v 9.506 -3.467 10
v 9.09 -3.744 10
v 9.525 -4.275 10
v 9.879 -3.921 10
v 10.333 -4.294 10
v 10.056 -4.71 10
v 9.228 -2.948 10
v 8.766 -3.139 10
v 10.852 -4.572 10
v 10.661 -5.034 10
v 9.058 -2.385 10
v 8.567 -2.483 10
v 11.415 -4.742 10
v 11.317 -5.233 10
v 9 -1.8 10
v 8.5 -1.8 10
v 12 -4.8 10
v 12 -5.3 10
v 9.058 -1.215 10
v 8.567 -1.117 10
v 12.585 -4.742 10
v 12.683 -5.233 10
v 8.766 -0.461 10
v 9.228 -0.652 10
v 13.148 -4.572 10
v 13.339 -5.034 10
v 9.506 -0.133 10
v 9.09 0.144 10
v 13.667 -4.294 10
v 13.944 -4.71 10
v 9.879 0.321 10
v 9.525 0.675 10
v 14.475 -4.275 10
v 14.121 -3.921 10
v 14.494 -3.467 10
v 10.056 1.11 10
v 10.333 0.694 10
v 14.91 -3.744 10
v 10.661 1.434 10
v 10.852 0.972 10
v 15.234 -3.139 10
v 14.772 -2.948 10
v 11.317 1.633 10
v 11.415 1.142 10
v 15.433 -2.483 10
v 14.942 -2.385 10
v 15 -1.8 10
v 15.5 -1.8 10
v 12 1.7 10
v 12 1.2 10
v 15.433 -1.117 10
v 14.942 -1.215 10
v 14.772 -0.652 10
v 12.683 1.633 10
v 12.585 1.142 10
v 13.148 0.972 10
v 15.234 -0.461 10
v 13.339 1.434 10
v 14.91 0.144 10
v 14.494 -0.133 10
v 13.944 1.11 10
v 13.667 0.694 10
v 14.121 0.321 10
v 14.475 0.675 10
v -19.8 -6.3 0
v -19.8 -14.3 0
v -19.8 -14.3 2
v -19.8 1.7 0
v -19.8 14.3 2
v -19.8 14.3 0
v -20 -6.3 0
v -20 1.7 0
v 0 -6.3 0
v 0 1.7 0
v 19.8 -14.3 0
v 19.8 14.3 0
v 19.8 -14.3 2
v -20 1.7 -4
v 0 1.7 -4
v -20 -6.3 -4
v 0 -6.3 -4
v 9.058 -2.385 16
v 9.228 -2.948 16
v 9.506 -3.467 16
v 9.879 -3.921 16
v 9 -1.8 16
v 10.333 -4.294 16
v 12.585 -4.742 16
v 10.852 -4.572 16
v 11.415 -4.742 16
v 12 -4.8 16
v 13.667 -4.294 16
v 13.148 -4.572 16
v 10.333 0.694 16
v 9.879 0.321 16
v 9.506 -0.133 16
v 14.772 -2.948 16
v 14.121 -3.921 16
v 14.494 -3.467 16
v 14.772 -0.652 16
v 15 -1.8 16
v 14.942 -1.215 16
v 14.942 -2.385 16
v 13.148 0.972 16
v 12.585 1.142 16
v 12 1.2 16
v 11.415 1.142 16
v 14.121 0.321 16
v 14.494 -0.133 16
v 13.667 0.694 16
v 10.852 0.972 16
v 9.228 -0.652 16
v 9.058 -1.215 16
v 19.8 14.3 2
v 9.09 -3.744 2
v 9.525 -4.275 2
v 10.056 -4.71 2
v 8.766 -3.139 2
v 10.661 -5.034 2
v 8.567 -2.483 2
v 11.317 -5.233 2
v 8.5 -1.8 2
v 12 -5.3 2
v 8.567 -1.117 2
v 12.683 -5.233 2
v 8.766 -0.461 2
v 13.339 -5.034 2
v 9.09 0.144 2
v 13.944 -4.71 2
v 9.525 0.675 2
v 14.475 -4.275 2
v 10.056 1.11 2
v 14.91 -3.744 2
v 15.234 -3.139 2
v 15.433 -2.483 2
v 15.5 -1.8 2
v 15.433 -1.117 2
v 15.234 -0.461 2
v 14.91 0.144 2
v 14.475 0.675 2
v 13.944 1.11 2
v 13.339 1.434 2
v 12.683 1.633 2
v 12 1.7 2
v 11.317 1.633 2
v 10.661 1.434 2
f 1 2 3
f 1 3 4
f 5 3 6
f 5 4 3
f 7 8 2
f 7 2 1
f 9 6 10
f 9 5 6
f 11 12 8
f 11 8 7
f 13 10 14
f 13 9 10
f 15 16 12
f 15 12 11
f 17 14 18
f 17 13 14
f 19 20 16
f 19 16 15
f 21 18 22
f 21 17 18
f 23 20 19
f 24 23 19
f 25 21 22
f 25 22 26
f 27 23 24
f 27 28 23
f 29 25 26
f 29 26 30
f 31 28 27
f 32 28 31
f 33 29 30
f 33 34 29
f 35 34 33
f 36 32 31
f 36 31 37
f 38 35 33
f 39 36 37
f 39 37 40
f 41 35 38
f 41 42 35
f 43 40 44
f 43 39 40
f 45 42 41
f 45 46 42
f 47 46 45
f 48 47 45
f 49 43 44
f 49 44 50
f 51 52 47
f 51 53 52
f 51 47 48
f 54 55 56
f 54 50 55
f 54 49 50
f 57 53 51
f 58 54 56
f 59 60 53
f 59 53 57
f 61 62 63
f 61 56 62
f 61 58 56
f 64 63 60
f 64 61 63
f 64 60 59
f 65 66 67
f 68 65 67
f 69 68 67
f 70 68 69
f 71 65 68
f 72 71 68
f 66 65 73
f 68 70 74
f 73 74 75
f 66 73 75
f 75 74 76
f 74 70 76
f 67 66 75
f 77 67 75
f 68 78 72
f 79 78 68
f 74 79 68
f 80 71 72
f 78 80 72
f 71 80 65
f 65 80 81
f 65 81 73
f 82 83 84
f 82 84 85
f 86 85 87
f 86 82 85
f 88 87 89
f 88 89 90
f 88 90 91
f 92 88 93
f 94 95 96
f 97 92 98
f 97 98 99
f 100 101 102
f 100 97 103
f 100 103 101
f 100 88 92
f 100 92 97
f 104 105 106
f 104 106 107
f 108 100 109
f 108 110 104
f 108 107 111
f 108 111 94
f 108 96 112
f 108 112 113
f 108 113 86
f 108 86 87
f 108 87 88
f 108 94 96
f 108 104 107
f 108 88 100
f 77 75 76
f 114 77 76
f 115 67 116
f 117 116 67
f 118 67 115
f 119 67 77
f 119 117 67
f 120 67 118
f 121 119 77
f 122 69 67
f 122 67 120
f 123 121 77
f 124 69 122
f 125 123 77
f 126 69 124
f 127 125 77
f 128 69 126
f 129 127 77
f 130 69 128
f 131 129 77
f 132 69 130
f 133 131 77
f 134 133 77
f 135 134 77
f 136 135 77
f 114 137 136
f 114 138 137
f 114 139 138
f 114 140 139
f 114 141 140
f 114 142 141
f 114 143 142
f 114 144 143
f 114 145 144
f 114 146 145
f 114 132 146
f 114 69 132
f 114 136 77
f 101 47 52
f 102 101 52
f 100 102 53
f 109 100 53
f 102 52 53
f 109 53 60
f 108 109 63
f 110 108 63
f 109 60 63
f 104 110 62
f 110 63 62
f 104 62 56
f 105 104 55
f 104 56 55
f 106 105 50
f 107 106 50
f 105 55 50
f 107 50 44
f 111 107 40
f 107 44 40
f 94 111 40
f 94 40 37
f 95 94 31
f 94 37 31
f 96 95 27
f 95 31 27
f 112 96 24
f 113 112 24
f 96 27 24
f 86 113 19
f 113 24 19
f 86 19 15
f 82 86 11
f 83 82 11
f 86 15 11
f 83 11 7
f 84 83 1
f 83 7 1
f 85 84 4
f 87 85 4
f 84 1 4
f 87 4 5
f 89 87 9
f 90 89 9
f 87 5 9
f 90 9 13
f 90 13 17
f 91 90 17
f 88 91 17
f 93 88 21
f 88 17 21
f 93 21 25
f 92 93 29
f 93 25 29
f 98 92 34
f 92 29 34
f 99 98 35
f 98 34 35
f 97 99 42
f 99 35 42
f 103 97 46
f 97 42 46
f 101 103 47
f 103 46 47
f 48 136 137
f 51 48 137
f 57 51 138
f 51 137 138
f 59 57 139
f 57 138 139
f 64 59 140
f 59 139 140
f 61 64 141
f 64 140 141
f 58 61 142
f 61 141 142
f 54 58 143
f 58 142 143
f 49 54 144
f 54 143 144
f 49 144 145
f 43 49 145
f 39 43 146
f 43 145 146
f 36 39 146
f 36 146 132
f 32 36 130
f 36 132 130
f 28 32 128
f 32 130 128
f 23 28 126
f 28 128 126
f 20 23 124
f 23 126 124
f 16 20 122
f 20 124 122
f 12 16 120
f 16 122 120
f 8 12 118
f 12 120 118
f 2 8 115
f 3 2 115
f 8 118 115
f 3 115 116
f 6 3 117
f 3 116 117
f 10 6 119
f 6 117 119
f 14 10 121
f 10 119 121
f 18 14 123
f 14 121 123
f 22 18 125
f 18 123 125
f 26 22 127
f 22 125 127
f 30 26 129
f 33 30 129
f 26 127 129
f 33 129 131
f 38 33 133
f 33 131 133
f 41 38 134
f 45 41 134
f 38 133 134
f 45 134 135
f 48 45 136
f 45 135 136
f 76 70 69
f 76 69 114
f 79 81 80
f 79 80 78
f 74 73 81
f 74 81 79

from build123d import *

# Parameters (mm, degrees)
F0_W     = 39.6
F0_H     = 28.6
F1_DEPTH = 2
F2_W     = 8
F2_H     = 4
F3_DEPTH = 20
F4_R     = 3.5
F5_DEPTH = 8
F6_R     = 3
F7_DEPTH = 6


with BuildPart() as f1:
    # F0 (on Top) → F1 (new body)
    with BuildSketch(Plane.XY):
        Rectangle(F0_W, F0_H)
    extrude(amount=F1_DEPTH)

    # F2 (on Right) → F3 (join)
    with BuildSketch(Plane.YZ):
        with Locations((-2.3, -2)):
            Rectangle(F2_W, F2_H)
    extrude(amount=-F3_DEPTH)

    # F4 (on face) → F5 (join)
    with BuildSketch(Plane.XY.offset(2)):
        with Locations((12, -1.8)):
            Circle(F4_R)
    extrude(amount=F5_DEPTH)

    # F6 (on face) → F7 (join)
    with BuildSketch(Plane.XY.offset(10)):
        with Locations((12, -1.8)):
            Circle(F6_R)
    extrude(amount=F7_DEPTH)


solid = f1.part
